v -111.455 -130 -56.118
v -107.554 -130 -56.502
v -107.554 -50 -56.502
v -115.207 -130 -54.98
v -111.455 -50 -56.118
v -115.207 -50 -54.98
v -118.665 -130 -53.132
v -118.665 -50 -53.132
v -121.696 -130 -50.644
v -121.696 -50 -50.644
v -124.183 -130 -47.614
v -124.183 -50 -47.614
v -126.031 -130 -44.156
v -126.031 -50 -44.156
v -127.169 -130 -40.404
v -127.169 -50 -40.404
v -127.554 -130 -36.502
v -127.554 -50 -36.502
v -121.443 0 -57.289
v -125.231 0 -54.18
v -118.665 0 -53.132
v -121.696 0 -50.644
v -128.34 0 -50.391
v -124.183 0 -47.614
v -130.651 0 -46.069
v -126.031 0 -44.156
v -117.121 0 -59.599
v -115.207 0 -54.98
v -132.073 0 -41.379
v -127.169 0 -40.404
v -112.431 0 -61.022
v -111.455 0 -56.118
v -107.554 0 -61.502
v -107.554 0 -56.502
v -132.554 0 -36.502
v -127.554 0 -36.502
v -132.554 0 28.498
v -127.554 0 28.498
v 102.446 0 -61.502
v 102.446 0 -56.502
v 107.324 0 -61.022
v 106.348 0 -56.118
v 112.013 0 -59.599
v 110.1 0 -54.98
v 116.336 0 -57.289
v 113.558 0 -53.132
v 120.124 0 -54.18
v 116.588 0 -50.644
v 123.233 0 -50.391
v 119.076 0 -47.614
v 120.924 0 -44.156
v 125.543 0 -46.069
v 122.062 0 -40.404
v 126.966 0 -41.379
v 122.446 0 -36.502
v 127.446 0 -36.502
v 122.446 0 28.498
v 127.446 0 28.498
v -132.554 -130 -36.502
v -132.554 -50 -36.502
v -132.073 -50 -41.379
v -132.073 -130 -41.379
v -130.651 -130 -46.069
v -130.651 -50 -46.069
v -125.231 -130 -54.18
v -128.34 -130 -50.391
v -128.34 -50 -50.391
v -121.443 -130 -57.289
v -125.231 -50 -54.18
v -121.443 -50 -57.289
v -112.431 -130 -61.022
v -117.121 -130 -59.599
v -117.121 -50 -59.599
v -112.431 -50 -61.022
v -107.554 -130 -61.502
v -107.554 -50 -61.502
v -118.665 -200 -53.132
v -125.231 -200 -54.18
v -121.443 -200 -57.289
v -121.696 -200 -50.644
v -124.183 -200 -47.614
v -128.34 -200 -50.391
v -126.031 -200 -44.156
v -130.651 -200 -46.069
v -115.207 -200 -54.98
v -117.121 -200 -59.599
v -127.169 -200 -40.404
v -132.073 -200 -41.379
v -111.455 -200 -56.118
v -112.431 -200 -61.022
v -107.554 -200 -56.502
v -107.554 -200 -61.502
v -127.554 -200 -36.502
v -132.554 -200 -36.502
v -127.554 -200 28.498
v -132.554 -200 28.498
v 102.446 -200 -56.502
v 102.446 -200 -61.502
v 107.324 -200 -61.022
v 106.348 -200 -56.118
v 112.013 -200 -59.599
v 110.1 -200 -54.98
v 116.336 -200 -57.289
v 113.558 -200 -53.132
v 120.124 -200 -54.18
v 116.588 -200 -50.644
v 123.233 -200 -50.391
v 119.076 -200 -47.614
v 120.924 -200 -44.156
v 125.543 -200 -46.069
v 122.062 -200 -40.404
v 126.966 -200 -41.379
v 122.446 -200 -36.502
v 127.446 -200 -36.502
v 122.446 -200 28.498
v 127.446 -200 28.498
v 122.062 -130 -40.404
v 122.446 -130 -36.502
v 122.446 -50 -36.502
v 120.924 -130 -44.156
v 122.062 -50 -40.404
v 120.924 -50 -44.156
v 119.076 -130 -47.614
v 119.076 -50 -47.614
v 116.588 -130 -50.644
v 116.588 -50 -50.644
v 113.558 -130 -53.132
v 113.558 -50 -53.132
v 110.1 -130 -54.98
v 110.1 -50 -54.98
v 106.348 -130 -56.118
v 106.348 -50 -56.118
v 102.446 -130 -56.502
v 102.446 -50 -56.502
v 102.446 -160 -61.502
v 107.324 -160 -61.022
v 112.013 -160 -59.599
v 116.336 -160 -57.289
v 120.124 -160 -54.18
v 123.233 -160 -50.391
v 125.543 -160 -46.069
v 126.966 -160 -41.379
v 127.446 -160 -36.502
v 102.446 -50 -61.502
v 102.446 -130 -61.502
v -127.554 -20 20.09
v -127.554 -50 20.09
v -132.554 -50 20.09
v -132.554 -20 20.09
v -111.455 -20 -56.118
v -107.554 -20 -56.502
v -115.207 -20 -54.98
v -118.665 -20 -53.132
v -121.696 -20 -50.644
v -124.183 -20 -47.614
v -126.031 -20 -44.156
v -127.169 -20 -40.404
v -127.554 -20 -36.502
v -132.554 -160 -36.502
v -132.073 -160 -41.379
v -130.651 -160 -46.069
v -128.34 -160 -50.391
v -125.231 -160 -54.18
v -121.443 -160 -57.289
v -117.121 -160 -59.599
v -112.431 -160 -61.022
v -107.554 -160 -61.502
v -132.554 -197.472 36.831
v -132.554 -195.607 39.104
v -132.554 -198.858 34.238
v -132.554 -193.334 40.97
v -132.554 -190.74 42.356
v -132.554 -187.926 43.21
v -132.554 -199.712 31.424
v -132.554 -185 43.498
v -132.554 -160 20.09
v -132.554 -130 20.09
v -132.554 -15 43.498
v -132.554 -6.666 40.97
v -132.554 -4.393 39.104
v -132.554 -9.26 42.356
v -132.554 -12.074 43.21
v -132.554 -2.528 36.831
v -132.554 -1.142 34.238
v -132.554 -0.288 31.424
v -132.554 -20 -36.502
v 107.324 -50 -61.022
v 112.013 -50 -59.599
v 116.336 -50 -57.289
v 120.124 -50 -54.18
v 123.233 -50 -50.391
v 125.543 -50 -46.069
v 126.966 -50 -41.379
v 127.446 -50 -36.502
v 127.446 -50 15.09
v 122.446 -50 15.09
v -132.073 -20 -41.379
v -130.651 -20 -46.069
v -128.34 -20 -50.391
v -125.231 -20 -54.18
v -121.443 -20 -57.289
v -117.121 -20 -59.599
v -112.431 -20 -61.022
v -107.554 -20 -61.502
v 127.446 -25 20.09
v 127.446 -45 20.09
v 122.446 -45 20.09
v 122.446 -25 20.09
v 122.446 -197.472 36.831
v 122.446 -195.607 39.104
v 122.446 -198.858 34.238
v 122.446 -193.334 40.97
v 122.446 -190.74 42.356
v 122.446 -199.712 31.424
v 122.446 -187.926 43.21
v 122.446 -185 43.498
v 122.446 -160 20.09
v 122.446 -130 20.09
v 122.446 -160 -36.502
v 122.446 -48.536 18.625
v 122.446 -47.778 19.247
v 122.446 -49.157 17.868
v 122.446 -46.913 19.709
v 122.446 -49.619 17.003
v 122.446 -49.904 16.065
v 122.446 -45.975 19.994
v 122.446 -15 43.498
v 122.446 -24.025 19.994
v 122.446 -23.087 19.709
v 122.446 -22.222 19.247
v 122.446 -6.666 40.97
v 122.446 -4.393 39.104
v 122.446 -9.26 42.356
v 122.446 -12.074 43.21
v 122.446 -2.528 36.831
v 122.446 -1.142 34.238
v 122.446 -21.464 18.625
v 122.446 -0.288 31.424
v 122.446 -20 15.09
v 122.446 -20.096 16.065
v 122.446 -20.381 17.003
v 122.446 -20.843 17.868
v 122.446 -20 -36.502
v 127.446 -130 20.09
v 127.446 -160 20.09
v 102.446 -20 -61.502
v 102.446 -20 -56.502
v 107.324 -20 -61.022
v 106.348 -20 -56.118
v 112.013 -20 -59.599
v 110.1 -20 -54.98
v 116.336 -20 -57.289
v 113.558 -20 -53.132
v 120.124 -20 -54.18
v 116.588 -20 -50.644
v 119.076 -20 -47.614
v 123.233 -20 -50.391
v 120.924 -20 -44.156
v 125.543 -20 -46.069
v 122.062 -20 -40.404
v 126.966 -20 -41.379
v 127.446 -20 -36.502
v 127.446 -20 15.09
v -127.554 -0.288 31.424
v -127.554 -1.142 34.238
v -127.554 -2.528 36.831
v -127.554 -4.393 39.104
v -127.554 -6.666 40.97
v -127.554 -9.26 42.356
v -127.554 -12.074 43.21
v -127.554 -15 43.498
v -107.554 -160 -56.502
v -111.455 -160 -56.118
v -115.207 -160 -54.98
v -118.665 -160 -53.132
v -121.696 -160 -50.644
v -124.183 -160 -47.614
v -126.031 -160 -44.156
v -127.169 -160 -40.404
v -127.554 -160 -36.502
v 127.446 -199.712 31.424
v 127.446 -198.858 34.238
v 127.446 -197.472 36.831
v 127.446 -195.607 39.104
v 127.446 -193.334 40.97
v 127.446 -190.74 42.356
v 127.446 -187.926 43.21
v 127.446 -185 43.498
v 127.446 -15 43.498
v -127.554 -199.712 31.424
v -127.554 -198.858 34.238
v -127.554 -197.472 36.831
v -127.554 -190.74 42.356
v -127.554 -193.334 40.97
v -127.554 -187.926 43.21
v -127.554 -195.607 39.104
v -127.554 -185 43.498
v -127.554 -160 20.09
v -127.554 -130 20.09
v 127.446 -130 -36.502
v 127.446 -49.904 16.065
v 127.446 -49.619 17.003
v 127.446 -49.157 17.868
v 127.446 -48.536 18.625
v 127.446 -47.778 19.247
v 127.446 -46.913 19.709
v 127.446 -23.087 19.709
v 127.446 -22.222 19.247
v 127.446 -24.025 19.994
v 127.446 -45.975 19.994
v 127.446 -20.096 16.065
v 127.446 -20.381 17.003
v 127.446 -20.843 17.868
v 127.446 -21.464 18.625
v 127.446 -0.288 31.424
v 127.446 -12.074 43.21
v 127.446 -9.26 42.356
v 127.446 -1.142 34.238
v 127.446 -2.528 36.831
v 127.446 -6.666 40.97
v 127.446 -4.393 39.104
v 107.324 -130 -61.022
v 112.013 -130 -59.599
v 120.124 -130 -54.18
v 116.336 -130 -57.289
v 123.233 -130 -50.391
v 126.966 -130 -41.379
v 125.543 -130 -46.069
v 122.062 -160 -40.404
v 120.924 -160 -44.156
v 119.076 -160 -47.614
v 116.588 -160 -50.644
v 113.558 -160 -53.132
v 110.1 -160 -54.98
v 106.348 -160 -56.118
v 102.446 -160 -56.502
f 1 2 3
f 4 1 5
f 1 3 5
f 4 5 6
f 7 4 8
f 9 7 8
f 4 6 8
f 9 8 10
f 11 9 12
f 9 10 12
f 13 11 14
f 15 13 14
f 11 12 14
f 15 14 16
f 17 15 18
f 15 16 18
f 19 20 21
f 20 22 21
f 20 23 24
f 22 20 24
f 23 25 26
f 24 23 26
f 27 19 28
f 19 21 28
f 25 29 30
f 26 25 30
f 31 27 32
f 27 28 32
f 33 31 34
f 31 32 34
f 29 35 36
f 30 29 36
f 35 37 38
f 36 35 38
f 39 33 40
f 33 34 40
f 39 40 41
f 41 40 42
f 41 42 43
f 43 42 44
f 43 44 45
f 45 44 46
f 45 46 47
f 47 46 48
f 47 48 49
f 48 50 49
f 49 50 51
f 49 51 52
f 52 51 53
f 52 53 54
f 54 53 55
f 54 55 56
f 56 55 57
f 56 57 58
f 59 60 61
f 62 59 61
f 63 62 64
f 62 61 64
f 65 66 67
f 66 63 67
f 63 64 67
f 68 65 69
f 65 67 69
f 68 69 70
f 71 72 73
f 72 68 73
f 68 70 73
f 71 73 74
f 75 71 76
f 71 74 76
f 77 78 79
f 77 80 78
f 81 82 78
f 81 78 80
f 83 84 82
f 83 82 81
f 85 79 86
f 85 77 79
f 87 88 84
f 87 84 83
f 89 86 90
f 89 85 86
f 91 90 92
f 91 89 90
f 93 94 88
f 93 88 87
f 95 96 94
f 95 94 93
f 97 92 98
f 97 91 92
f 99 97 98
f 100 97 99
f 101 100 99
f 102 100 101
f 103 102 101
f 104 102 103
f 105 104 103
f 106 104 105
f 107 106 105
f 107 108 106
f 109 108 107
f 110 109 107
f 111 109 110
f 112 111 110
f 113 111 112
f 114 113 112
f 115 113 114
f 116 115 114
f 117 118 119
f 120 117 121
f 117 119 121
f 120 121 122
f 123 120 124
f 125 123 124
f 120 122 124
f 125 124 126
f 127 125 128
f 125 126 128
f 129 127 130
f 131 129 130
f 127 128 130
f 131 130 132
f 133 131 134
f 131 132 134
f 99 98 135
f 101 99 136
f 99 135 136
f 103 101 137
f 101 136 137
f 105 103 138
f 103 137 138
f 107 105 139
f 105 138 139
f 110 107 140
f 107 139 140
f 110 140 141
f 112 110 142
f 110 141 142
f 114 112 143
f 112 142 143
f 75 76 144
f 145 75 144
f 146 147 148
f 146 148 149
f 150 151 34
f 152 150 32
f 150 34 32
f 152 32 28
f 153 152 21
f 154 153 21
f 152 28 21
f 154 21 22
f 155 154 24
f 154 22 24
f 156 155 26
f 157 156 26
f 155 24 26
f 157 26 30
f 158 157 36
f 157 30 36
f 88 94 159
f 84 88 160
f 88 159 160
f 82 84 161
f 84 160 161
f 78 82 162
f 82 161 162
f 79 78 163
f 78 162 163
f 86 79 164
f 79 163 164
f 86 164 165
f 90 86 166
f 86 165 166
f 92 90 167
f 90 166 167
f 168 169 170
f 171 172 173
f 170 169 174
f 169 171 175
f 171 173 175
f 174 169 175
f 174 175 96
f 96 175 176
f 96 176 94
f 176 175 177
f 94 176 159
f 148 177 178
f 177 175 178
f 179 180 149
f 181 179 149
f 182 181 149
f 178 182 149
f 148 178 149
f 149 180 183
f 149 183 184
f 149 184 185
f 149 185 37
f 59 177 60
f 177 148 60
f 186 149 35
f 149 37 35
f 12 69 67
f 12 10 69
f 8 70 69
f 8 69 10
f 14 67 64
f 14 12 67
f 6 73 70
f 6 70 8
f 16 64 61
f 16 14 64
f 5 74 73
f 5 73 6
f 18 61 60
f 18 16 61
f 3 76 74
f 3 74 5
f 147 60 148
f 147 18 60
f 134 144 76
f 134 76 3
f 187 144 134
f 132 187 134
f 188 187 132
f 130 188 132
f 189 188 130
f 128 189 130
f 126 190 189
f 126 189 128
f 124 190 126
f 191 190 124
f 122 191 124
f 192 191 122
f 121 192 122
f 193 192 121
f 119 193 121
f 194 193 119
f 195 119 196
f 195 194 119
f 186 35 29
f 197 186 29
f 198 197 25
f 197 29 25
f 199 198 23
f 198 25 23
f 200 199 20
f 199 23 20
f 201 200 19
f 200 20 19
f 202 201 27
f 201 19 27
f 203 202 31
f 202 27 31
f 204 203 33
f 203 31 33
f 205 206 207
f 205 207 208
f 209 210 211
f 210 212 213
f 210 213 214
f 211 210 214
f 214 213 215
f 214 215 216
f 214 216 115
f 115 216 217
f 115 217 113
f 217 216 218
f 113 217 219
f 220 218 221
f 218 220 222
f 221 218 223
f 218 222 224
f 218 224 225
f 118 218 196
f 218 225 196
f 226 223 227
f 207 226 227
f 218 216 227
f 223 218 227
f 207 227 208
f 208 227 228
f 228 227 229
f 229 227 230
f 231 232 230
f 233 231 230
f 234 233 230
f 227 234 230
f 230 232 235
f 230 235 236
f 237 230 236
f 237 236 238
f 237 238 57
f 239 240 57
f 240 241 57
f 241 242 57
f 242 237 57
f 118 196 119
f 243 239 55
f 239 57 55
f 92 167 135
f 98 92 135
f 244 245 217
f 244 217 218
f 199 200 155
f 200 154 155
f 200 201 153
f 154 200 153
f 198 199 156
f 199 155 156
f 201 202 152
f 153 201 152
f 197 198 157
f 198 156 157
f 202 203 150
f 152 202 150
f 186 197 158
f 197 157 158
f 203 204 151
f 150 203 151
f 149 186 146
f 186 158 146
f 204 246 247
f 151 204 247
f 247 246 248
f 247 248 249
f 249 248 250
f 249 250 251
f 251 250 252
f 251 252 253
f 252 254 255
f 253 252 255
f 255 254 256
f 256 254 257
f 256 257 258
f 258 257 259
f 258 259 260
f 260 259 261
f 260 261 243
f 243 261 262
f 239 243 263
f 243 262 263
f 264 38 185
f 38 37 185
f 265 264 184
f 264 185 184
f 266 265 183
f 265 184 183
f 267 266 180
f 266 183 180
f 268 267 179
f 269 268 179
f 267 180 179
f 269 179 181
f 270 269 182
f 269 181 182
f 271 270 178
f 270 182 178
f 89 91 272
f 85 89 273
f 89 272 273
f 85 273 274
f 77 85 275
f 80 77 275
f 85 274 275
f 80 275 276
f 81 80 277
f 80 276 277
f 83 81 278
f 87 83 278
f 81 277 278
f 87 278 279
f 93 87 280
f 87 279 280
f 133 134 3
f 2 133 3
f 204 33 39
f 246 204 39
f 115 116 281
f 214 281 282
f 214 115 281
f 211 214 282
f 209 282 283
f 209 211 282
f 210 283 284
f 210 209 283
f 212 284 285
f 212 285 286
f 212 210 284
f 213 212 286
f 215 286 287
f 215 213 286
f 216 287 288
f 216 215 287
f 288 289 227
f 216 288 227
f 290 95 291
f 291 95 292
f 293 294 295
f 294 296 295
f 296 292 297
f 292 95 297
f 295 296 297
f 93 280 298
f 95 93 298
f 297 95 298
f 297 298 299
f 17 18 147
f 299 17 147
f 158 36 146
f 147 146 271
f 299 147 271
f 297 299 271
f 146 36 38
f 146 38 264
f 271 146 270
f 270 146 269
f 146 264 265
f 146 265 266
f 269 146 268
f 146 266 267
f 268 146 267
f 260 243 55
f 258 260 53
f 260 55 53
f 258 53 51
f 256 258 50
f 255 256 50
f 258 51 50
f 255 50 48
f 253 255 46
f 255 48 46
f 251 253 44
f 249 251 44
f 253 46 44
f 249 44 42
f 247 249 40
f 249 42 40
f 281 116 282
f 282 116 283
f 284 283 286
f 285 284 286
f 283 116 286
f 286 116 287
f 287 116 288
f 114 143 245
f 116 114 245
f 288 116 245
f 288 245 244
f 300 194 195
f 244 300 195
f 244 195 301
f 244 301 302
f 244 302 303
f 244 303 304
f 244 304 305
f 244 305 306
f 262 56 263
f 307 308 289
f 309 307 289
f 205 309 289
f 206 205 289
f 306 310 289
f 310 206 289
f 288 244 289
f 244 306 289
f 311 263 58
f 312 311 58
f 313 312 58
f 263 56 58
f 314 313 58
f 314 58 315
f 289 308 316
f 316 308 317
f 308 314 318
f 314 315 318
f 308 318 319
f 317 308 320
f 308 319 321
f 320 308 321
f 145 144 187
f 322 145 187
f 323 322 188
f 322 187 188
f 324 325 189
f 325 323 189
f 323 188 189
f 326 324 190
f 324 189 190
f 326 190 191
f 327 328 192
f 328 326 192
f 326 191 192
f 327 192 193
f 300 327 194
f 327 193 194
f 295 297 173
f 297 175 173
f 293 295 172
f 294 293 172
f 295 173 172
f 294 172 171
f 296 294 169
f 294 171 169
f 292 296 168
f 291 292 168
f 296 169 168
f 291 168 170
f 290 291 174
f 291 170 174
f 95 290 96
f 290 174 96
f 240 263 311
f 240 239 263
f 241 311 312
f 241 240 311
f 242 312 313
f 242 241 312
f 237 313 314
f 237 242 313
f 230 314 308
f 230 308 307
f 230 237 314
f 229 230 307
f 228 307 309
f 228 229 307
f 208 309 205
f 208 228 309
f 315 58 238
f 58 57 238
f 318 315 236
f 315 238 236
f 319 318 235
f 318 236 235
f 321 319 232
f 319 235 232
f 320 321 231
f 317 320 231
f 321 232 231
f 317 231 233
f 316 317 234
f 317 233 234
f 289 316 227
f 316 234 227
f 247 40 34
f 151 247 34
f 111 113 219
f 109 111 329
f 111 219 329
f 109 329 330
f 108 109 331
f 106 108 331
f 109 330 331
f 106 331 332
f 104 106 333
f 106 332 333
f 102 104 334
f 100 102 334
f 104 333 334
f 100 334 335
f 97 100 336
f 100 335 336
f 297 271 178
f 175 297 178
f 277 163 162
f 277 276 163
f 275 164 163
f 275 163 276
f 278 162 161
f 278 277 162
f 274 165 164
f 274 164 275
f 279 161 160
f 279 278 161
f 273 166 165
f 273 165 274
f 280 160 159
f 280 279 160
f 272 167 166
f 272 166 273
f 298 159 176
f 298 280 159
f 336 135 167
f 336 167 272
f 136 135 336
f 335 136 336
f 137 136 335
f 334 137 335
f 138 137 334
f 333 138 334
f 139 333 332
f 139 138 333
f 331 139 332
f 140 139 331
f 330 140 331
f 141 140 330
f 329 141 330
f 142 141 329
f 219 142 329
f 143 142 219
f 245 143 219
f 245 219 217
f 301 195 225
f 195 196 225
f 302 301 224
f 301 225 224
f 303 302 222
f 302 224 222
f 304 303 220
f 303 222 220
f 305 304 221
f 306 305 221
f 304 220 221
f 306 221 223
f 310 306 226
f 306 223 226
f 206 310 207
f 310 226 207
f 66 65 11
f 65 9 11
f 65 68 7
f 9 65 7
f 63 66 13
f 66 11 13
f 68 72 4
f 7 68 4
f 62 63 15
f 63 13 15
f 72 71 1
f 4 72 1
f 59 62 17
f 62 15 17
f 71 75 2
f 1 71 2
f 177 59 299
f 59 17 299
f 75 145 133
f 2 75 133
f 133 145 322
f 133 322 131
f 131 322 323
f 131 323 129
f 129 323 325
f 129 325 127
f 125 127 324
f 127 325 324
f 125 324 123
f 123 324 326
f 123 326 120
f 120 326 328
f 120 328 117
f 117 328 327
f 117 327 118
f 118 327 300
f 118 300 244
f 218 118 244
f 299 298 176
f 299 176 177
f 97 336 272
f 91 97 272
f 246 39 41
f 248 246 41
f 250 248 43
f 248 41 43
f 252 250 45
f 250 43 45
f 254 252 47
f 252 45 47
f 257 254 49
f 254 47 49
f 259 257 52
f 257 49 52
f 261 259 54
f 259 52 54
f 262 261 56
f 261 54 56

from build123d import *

# Parameters (mm, degrees)
F2_DEPTH = 200
F3_W     = 30
F3_H     = 100
F4_DEPTH = 500
F6_R     = 15
F7_R     = 5


with BuildPart() as f2:
    # F0 (on Front) → F2 (new body)
    with BuildSketch(Plane.XZ):
        with BuildLine():
            Line((-127.5536519289, -36.5021181107), (-127.5536519289, 43.4978818893))
            Line((-127.5536519289, 43.4978818893), (-132.5536519289, 43.4978818893))
            Line((-132.5536519289, 43.4978818893), (-132.5536519289, -36.5021181107))
            ThreePointArc((-132.5536519289, -36.5021181107), (-125.2313214586, -54.1797876403), (-107.5536519289, -61.5021181107))
            Line((-107.5536519289, -61.5021181107), (102.4463480711, -61.5021181107))
            ThreePointArc((102.4463480711, -61.5021181107), (120.1240176008, -54.1797876403), (127.4463480711, -36.5021181107))
            Line((127.4463480711, -36.5021181107), (127.4463480711, 43.4978818893))
            Line((127.4463480711, 43.4978818893), (122.4463480711, 43.4978818893))
            Line((122.4463480711, 43.4978818893), (122.4463480711, -36.5021181107))
            ThreePointArc((122.4463480711, -36.5021181107), (116.5884836948, -50.6442537344), (102.4463480711, -56.5021181107))
            Line((102.4463480711, -56.5021181107), (-107.5536519289, -56.5021181107))
            ThreePointArc((-107.5536519289, -56.5021181107), (-121.6957875526, -50.6442537344), (-127.5536519289, -36.5021181107))
        make_face()
    extrude(amount=F2_DEPTH)


with BuildPart() as f4:
    # F3 (on offset) → F4 (new body)
    with BuildSketch(Plane.YZ.offset(200)):
        with Locations((-145, -29.9103426556)):
            Rectangle(F3_W, F3_H)
    extrude(amount=-F4_DEPTH)


with BuildPart() as f4b:
    # F3 (on offset) → F4, piece 2 (new body)
    with BuildSketch(Plane.YZ.offset(200)):
        with Locations((-35, -29.9103426556)):
            Rectangle(F3_W, F3_H)
    extrude(amount=-F4_DEPTH)


with BuildPart() as f2_1:
    add(f2.part)

    # F5: cut F4, F4b
    add(f4.part, mode=Mode.SUBTRACT)
    add(f4b.part, mode=Mode.SUBTRACT)

    # F6
    f6_edges = [f2_1.edges().sort_by_distance(p)[0] for p in [
        (-130.053652, -200, 43.497882),
        (-130.053652, 0, 43.497882),
        (124.946348, -200, 43.497882),
        (124.946348, 0, 43.497882),
    ]]
    fillet(f6_edges, radius=F6_R)

    # F7
    f7_edges = [f2_1.edges().sort_by_distance(p)[0] for p in [
        (124.946348, -20, 20.089657),
        (124.946348, -50, 20.089657),
    ]]
    fillet(f7_edges, radius=F7_R)


solid = f2_1.part
